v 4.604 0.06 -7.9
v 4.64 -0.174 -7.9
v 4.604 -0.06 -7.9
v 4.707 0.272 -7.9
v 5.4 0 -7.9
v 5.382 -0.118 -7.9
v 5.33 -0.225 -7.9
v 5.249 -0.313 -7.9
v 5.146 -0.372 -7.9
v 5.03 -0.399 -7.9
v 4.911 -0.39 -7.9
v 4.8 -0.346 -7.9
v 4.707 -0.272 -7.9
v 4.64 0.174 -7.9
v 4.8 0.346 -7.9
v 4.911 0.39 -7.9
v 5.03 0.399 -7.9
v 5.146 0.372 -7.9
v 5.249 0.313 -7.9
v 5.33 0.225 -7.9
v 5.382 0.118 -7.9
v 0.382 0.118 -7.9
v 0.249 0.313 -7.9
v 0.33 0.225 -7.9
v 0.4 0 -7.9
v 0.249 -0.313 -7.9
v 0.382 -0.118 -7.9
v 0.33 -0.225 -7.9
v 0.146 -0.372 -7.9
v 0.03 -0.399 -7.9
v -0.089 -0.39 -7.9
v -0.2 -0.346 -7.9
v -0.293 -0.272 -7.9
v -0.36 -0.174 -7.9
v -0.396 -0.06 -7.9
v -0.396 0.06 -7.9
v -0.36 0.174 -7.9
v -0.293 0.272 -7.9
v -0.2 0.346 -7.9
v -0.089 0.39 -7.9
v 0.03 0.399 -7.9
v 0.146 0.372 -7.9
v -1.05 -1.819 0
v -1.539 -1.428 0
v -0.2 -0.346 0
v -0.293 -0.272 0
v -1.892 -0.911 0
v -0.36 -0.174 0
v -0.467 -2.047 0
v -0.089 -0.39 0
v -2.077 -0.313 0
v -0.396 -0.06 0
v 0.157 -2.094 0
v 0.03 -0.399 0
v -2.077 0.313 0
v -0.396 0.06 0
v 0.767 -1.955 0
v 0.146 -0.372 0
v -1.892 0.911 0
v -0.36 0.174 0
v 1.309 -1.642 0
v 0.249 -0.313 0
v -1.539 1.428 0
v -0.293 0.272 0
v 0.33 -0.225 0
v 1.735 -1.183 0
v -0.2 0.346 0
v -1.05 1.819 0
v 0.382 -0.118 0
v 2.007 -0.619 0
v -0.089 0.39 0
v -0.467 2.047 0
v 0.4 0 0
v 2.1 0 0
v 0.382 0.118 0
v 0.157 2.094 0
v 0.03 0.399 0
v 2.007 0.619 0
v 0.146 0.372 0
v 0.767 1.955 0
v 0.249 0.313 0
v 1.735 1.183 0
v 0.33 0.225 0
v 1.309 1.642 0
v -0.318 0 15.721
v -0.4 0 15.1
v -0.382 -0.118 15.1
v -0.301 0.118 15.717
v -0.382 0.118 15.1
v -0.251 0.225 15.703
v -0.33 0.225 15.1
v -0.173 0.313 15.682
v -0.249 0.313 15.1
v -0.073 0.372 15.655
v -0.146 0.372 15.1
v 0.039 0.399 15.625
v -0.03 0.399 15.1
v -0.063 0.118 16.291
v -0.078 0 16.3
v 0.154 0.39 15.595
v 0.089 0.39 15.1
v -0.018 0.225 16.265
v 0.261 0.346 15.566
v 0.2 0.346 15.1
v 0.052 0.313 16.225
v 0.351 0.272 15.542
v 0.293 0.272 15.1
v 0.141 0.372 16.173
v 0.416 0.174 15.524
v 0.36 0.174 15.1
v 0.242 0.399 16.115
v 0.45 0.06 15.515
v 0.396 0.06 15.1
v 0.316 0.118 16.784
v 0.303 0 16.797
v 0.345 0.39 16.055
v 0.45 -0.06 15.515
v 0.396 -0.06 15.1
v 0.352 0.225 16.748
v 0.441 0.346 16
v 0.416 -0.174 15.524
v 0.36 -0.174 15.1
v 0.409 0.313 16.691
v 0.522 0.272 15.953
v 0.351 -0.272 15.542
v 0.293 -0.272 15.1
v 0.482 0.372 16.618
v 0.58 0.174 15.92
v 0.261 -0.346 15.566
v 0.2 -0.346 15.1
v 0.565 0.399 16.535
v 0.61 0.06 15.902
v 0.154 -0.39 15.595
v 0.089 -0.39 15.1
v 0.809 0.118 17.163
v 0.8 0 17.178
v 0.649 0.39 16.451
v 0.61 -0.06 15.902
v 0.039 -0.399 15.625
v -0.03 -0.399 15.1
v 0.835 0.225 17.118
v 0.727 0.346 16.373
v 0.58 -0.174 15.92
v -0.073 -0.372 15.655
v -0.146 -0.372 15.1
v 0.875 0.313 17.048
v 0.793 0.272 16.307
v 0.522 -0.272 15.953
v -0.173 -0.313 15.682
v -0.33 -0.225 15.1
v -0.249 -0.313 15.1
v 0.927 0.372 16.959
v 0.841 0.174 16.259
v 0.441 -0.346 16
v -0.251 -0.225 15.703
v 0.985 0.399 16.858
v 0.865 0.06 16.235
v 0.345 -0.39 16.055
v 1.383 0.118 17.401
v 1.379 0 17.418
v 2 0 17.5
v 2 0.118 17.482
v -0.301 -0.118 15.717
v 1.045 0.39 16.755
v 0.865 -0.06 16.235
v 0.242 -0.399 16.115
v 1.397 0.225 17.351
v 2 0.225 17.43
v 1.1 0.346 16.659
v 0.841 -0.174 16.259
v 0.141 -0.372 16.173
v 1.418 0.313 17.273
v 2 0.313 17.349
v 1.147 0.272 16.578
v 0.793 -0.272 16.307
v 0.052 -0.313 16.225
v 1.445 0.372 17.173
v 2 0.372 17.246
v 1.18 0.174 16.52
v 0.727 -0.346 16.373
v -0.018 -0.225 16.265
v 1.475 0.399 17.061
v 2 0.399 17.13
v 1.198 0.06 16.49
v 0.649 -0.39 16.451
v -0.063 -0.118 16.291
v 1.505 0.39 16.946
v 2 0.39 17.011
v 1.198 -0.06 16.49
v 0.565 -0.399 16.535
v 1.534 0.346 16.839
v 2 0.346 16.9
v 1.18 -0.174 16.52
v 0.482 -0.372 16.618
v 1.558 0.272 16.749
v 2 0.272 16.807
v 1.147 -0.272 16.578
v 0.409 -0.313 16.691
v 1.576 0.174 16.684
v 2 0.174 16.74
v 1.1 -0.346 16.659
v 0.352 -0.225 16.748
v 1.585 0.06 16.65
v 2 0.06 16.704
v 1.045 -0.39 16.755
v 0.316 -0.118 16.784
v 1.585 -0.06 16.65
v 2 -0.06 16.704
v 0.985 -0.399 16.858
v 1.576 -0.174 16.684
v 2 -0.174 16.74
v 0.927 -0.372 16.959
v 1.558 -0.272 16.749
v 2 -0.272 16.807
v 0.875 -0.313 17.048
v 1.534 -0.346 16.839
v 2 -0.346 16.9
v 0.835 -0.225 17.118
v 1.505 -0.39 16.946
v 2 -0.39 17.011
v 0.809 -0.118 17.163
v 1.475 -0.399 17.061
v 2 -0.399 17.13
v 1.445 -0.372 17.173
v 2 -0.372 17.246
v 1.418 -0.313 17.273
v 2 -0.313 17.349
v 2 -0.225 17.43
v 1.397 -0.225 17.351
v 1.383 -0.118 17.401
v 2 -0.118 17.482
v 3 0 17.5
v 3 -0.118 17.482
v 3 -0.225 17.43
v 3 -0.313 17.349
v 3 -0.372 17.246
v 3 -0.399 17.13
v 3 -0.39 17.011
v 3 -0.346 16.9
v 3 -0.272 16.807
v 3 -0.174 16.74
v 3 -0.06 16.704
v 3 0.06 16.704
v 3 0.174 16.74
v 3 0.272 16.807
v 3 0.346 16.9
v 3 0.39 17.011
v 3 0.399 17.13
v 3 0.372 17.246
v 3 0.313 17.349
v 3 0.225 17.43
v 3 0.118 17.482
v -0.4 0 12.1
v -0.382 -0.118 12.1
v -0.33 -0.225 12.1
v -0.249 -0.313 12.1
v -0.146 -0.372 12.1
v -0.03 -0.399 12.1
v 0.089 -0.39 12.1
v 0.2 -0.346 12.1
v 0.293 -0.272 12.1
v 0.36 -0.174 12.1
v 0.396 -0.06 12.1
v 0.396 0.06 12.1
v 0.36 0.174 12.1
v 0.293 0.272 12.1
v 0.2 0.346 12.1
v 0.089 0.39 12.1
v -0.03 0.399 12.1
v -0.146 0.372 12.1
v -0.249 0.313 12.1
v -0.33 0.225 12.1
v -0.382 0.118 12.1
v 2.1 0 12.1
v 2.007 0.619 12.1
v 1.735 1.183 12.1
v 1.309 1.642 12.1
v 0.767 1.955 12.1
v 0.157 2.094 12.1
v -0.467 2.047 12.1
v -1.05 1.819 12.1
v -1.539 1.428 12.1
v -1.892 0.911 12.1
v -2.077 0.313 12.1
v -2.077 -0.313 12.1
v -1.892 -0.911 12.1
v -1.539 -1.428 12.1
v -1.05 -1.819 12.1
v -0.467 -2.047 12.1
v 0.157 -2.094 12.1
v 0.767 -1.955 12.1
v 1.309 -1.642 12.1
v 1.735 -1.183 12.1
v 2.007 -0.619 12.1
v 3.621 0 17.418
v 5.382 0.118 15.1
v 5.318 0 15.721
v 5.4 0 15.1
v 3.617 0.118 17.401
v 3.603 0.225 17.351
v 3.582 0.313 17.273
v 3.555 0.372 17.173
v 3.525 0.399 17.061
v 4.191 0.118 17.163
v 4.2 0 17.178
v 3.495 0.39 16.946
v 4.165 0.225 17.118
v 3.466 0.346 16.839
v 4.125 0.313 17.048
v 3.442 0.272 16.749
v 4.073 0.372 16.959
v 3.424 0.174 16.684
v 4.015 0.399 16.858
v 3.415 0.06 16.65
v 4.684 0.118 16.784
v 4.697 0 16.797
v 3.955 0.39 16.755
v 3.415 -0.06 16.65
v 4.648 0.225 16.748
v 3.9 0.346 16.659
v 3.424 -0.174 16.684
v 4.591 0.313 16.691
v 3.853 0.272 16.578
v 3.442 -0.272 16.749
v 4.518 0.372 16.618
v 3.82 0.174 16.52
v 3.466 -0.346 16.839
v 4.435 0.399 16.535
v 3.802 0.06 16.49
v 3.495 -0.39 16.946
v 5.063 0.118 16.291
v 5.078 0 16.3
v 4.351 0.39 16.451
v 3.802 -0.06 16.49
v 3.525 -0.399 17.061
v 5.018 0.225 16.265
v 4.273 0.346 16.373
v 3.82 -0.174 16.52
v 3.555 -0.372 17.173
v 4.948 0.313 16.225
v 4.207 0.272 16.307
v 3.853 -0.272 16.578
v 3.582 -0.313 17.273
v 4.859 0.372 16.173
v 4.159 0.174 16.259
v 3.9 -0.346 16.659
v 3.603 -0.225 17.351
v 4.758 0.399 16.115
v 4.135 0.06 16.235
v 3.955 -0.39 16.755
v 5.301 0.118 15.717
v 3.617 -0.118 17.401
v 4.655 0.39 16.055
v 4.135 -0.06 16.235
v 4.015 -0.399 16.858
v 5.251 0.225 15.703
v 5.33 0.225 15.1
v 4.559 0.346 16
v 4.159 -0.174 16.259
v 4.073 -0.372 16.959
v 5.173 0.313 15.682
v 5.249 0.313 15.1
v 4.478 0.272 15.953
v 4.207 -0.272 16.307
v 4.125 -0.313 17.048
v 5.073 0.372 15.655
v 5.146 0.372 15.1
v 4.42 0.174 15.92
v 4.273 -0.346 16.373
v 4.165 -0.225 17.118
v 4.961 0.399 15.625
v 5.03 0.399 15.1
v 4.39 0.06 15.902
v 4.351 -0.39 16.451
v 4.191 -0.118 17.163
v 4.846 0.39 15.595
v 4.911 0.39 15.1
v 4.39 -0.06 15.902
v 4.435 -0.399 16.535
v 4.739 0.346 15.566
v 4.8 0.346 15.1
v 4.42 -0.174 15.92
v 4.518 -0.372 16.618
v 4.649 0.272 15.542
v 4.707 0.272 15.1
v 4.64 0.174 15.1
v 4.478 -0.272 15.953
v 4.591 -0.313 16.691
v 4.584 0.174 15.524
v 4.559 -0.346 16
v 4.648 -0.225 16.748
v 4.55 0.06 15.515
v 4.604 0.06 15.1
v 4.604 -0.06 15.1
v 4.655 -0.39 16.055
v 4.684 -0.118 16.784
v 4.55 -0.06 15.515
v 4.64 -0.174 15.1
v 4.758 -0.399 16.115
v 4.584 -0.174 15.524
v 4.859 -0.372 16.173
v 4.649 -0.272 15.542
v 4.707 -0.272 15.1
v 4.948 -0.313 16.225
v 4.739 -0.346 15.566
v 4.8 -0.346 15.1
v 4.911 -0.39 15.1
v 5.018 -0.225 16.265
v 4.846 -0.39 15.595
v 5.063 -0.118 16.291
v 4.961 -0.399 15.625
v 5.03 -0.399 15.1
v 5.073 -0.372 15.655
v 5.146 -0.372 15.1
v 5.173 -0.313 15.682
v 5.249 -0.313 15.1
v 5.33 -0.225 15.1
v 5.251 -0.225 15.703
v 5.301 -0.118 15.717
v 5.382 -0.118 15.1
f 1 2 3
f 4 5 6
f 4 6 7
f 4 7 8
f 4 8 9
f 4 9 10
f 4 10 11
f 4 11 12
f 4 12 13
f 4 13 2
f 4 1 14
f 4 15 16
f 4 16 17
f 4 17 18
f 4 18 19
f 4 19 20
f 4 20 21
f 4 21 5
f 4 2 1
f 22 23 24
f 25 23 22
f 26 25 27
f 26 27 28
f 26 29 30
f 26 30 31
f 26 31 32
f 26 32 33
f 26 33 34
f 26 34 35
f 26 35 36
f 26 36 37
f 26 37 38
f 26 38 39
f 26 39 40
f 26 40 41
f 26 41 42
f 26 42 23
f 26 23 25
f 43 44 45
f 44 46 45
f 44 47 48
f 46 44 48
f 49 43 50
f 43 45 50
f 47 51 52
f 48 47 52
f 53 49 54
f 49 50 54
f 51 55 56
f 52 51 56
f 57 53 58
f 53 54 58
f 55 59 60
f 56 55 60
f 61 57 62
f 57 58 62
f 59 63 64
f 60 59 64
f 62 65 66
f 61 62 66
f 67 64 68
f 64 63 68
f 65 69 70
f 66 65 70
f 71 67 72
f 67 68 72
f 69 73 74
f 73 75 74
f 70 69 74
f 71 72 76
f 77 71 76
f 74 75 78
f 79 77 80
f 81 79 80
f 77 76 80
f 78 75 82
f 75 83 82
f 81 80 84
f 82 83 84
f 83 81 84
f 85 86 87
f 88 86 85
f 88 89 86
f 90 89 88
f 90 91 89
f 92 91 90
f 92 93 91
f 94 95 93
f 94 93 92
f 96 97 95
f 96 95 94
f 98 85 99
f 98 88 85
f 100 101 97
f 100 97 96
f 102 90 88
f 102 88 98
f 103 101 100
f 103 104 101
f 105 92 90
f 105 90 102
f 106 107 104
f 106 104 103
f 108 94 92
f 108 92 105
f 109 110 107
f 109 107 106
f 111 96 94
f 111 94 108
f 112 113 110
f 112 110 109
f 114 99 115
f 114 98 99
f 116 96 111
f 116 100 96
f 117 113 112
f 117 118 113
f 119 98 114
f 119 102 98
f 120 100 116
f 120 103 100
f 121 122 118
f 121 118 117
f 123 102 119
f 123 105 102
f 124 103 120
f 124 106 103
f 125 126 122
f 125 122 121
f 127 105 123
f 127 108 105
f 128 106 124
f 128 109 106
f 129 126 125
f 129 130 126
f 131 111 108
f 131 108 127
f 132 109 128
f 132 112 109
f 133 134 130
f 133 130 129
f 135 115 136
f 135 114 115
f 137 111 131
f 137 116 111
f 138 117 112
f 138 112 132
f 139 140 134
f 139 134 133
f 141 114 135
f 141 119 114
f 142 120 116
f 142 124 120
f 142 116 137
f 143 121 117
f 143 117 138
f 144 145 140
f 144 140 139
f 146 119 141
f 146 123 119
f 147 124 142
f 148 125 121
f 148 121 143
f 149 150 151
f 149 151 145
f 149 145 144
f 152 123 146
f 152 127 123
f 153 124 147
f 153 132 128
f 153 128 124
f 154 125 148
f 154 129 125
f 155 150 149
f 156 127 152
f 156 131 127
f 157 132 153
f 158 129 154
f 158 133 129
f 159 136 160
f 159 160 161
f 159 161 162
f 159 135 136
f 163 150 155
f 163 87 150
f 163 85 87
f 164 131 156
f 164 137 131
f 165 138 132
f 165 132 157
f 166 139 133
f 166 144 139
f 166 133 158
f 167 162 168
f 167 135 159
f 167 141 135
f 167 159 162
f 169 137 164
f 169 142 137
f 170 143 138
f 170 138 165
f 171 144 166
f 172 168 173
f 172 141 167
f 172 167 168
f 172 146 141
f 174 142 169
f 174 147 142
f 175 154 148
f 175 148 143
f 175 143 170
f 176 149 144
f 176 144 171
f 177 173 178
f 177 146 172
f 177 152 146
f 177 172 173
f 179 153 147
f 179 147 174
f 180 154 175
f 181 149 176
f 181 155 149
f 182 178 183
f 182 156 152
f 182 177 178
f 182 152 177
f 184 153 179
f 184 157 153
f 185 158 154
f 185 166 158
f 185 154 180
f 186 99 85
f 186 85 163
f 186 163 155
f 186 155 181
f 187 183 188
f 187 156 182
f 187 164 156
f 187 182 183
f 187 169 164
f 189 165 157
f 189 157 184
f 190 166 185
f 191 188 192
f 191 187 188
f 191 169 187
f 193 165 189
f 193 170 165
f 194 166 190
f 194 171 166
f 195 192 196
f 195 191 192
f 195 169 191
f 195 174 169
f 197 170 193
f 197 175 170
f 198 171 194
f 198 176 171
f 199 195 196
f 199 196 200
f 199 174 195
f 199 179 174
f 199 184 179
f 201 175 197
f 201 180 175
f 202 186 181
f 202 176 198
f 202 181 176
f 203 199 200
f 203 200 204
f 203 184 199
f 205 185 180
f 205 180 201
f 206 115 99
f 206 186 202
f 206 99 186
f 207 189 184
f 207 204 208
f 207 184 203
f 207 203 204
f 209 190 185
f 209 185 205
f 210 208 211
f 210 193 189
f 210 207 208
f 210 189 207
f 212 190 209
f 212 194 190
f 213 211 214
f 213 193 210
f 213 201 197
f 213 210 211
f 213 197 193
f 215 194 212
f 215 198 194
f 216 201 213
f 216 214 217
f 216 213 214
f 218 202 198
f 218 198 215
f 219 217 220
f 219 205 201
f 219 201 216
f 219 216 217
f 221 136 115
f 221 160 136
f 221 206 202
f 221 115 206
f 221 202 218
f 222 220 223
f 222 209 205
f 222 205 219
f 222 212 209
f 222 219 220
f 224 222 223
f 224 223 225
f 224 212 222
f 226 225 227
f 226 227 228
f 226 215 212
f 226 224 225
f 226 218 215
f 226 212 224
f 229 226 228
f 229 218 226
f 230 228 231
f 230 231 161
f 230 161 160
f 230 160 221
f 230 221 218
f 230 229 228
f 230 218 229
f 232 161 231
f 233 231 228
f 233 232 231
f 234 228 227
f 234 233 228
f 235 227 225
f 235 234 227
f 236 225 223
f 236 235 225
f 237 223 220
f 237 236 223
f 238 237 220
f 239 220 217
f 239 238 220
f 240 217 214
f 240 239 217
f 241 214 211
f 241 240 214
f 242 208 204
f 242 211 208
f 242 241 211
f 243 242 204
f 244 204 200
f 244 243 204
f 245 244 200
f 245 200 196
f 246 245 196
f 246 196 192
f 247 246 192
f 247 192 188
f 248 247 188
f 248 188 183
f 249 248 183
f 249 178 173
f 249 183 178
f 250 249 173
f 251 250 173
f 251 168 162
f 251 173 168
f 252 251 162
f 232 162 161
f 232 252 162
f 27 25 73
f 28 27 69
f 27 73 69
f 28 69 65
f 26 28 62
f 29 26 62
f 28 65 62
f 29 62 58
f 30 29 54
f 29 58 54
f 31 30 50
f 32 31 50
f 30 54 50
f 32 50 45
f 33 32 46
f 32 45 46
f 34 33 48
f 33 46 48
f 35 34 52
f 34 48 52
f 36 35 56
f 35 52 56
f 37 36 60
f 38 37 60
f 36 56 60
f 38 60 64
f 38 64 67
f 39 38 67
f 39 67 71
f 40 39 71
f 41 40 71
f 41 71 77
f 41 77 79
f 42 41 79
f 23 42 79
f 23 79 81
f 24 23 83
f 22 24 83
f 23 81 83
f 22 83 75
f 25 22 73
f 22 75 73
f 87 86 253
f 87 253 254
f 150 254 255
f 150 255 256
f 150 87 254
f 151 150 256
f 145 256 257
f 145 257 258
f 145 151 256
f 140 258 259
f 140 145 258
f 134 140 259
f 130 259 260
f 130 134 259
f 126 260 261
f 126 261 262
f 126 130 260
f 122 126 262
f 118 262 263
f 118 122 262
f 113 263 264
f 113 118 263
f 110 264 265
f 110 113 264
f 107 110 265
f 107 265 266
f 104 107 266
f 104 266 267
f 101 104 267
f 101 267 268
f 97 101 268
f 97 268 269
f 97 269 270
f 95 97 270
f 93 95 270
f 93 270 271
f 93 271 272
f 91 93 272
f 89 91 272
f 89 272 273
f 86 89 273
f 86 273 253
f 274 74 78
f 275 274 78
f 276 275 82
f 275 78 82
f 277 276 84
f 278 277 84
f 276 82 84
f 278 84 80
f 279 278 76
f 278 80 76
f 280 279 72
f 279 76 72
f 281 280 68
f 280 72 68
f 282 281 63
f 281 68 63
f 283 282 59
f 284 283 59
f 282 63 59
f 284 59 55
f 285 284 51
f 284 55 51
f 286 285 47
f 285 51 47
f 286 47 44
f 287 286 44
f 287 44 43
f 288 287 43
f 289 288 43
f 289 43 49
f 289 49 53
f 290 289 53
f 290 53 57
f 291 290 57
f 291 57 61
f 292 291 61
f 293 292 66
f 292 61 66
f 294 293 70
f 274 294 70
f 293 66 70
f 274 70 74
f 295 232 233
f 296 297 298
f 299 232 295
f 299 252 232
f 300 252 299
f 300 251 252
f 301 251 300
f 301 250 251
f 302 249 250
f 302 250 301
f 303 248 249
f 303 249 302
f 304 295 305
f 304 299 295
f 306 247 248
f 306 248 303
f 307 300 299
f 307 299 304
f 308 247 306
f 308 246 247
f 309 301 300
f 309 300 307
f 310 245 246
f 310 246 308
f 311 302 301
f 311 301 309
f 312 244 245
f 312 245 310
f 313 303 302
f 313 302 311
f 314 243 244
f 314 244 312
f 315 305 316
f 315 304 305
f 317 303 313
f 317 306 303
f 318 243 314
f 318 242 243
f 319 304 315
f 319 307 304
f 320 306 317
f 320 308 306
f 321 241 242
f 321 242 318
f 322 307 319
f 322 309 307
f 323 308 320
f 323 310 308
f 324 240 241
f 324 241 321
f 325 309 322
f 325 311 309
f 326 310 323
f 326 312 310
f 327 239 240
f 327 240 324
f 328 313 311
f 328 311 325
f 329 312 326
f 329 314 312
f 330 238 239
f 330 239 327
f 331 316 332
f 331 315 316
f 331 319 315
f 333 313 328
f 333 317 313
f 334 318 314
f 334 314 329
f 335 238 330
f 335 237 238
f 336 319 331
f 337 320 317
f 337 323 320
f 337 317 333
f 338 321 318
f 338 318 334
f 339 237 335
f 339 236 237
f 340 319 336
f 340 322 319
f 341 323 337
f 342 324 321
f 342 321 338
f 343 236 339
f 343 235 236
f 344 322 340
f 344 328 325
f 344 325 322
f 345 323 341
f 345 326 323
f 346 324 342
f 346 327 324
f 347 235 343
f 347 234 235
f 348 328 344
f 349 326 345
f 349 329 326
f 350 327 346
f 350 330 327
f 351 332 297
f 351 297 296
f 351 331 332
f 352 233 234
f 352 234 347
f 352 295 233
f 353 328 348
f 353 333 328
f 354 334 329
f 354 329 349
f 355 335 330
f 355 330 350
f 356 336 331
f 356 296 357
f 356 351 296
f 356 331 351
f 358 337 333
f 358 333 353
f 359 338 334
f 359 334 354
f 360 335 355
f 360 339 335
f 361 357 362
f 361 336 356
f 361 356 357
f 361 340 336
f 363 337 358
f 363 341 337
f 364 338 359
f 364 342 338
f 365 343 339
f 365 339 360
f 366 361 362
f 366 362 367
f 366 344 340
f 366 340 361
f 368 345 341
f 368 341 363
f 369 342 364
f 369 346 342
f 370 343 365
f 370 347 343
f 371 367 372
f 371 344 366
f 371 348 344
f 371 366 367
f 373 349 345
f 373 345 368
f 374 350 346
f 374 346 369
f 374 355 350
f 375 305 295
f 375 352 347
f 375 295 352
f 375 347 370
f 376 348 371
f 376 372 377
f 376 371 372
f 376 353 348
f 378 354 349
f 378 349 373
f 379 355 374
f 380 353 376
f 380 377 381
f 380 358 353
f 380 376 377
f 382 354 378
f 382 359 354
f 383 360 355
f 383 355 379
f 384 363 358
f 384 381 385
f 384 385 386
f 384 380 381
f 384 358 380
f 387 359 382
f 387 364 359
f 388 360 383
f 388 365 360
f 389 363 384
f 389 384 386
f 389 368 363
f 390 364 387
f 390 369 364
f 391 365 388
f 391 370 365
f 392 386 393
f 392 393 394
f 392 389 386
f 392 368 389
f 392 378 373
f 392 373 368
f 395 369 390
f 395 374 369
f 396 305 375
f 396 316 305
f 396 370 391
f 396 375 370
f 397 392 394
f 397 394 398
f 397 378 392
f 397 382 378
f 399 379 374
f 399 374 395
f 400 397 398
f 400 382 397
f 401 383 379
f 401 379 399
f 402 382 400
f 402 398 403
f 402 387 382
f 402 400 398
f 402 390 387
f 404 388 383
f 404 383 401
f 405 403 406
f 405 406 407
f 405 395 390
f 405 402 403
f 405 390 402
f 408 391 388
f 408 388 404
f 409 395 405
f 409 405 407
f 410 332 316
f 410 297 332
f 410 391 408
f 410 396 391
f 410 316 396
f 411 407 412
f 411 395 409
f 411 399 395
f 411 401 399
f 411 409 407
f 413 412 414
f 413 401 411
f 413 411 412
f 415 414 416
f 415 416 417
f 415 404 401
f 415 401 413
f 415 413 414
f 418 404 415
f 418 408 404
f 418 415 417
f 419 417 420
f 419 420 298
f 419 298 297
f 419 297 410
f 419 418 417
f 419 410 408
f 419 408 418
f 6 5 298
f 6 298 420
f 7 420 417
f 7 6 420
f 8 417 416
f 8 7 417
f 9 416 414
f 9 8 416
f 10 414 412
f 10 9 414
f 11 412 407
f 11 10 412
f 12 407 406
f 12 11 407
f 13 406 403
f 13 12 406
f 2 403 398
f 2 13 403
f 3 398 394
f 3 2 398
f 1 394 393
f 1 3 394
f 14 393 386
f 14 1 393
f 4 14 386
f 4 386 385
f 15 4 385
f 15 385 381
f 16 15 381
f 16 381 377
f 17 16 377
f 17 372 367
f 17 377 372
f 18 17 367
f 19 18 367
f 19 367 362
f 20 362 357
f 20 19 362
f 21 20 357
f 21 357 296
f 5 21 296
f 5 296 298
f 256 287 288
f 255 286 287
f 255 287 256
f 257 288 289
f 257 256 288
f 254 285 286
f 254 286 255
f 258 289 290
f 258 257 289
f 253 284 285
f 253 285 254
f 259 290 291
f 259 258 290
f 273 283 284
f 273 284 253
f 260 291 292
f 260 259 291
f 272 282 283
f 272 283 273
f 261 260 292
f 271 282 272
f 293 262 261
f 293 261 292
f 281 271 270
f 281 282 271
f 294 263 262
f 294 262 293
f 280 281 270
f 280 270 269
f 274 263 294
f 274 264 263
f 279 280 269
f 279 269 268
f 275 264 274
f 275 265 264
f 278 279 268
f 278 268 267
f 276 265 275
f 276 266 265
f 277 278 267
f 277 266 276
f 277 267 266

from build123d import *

# Parameters (mm, degrees)
SKETCH2_R           = 2.1
RESISTOR_BODY_DEPTH = 12.1
LEAD1_PROFILE_R     = 0.4
SKETCH6_R           = 0.4
LEAD2_DEPTH         = 7.9


with BuildPart() as part:
    # Sketch2 → Resistor Body (new body)
    with BuildSketch(Plane.XY):
        Circle(SKETCH2_R)
    extrude(amount=RESISTOR_BODY_DEPTH)

    # Lead1: sweep along a path in Lead1 Path
    with BuildLine(Plane(origin=(0, 0, 0), x_dir=(1, 0, 0), z_dir=(0, 1, 0))) as lead1_path:
        Line((0, -12.1), (0, -15.1))
        ThreePointArc((0, -15.1), (0.585786438, -16.514213562), (2, -17.1))
        Line((2, -17.1), (3, -17.1))
        ThreePointArc((3, -17.1), (4.414213562, -16.514213562), (5, -15.1))
        Line((5, -15.1), (5, 7.9))
    # Lead1 Profile → Lead1 (sweep)
    with BuildSketch(Plane(origin=(0, 0, 12.1), x_dir=(-1, 0, 0), z_dir=(0, 0, 1))):
        Circle(LEAD1_PROFILE_R)
    sweep(path=lead1_path.line)

    # Sketch6 → Lead2 (add)
    with BuildSketch(Plane(origin=(0, 0, 0), x_dir=(1, 0, 0), z_dir=(0, 0, -1))):
        Circle(SKETCH6_R)
    extrude(amount=LEAD2_DEPTH)


solid = part.part
